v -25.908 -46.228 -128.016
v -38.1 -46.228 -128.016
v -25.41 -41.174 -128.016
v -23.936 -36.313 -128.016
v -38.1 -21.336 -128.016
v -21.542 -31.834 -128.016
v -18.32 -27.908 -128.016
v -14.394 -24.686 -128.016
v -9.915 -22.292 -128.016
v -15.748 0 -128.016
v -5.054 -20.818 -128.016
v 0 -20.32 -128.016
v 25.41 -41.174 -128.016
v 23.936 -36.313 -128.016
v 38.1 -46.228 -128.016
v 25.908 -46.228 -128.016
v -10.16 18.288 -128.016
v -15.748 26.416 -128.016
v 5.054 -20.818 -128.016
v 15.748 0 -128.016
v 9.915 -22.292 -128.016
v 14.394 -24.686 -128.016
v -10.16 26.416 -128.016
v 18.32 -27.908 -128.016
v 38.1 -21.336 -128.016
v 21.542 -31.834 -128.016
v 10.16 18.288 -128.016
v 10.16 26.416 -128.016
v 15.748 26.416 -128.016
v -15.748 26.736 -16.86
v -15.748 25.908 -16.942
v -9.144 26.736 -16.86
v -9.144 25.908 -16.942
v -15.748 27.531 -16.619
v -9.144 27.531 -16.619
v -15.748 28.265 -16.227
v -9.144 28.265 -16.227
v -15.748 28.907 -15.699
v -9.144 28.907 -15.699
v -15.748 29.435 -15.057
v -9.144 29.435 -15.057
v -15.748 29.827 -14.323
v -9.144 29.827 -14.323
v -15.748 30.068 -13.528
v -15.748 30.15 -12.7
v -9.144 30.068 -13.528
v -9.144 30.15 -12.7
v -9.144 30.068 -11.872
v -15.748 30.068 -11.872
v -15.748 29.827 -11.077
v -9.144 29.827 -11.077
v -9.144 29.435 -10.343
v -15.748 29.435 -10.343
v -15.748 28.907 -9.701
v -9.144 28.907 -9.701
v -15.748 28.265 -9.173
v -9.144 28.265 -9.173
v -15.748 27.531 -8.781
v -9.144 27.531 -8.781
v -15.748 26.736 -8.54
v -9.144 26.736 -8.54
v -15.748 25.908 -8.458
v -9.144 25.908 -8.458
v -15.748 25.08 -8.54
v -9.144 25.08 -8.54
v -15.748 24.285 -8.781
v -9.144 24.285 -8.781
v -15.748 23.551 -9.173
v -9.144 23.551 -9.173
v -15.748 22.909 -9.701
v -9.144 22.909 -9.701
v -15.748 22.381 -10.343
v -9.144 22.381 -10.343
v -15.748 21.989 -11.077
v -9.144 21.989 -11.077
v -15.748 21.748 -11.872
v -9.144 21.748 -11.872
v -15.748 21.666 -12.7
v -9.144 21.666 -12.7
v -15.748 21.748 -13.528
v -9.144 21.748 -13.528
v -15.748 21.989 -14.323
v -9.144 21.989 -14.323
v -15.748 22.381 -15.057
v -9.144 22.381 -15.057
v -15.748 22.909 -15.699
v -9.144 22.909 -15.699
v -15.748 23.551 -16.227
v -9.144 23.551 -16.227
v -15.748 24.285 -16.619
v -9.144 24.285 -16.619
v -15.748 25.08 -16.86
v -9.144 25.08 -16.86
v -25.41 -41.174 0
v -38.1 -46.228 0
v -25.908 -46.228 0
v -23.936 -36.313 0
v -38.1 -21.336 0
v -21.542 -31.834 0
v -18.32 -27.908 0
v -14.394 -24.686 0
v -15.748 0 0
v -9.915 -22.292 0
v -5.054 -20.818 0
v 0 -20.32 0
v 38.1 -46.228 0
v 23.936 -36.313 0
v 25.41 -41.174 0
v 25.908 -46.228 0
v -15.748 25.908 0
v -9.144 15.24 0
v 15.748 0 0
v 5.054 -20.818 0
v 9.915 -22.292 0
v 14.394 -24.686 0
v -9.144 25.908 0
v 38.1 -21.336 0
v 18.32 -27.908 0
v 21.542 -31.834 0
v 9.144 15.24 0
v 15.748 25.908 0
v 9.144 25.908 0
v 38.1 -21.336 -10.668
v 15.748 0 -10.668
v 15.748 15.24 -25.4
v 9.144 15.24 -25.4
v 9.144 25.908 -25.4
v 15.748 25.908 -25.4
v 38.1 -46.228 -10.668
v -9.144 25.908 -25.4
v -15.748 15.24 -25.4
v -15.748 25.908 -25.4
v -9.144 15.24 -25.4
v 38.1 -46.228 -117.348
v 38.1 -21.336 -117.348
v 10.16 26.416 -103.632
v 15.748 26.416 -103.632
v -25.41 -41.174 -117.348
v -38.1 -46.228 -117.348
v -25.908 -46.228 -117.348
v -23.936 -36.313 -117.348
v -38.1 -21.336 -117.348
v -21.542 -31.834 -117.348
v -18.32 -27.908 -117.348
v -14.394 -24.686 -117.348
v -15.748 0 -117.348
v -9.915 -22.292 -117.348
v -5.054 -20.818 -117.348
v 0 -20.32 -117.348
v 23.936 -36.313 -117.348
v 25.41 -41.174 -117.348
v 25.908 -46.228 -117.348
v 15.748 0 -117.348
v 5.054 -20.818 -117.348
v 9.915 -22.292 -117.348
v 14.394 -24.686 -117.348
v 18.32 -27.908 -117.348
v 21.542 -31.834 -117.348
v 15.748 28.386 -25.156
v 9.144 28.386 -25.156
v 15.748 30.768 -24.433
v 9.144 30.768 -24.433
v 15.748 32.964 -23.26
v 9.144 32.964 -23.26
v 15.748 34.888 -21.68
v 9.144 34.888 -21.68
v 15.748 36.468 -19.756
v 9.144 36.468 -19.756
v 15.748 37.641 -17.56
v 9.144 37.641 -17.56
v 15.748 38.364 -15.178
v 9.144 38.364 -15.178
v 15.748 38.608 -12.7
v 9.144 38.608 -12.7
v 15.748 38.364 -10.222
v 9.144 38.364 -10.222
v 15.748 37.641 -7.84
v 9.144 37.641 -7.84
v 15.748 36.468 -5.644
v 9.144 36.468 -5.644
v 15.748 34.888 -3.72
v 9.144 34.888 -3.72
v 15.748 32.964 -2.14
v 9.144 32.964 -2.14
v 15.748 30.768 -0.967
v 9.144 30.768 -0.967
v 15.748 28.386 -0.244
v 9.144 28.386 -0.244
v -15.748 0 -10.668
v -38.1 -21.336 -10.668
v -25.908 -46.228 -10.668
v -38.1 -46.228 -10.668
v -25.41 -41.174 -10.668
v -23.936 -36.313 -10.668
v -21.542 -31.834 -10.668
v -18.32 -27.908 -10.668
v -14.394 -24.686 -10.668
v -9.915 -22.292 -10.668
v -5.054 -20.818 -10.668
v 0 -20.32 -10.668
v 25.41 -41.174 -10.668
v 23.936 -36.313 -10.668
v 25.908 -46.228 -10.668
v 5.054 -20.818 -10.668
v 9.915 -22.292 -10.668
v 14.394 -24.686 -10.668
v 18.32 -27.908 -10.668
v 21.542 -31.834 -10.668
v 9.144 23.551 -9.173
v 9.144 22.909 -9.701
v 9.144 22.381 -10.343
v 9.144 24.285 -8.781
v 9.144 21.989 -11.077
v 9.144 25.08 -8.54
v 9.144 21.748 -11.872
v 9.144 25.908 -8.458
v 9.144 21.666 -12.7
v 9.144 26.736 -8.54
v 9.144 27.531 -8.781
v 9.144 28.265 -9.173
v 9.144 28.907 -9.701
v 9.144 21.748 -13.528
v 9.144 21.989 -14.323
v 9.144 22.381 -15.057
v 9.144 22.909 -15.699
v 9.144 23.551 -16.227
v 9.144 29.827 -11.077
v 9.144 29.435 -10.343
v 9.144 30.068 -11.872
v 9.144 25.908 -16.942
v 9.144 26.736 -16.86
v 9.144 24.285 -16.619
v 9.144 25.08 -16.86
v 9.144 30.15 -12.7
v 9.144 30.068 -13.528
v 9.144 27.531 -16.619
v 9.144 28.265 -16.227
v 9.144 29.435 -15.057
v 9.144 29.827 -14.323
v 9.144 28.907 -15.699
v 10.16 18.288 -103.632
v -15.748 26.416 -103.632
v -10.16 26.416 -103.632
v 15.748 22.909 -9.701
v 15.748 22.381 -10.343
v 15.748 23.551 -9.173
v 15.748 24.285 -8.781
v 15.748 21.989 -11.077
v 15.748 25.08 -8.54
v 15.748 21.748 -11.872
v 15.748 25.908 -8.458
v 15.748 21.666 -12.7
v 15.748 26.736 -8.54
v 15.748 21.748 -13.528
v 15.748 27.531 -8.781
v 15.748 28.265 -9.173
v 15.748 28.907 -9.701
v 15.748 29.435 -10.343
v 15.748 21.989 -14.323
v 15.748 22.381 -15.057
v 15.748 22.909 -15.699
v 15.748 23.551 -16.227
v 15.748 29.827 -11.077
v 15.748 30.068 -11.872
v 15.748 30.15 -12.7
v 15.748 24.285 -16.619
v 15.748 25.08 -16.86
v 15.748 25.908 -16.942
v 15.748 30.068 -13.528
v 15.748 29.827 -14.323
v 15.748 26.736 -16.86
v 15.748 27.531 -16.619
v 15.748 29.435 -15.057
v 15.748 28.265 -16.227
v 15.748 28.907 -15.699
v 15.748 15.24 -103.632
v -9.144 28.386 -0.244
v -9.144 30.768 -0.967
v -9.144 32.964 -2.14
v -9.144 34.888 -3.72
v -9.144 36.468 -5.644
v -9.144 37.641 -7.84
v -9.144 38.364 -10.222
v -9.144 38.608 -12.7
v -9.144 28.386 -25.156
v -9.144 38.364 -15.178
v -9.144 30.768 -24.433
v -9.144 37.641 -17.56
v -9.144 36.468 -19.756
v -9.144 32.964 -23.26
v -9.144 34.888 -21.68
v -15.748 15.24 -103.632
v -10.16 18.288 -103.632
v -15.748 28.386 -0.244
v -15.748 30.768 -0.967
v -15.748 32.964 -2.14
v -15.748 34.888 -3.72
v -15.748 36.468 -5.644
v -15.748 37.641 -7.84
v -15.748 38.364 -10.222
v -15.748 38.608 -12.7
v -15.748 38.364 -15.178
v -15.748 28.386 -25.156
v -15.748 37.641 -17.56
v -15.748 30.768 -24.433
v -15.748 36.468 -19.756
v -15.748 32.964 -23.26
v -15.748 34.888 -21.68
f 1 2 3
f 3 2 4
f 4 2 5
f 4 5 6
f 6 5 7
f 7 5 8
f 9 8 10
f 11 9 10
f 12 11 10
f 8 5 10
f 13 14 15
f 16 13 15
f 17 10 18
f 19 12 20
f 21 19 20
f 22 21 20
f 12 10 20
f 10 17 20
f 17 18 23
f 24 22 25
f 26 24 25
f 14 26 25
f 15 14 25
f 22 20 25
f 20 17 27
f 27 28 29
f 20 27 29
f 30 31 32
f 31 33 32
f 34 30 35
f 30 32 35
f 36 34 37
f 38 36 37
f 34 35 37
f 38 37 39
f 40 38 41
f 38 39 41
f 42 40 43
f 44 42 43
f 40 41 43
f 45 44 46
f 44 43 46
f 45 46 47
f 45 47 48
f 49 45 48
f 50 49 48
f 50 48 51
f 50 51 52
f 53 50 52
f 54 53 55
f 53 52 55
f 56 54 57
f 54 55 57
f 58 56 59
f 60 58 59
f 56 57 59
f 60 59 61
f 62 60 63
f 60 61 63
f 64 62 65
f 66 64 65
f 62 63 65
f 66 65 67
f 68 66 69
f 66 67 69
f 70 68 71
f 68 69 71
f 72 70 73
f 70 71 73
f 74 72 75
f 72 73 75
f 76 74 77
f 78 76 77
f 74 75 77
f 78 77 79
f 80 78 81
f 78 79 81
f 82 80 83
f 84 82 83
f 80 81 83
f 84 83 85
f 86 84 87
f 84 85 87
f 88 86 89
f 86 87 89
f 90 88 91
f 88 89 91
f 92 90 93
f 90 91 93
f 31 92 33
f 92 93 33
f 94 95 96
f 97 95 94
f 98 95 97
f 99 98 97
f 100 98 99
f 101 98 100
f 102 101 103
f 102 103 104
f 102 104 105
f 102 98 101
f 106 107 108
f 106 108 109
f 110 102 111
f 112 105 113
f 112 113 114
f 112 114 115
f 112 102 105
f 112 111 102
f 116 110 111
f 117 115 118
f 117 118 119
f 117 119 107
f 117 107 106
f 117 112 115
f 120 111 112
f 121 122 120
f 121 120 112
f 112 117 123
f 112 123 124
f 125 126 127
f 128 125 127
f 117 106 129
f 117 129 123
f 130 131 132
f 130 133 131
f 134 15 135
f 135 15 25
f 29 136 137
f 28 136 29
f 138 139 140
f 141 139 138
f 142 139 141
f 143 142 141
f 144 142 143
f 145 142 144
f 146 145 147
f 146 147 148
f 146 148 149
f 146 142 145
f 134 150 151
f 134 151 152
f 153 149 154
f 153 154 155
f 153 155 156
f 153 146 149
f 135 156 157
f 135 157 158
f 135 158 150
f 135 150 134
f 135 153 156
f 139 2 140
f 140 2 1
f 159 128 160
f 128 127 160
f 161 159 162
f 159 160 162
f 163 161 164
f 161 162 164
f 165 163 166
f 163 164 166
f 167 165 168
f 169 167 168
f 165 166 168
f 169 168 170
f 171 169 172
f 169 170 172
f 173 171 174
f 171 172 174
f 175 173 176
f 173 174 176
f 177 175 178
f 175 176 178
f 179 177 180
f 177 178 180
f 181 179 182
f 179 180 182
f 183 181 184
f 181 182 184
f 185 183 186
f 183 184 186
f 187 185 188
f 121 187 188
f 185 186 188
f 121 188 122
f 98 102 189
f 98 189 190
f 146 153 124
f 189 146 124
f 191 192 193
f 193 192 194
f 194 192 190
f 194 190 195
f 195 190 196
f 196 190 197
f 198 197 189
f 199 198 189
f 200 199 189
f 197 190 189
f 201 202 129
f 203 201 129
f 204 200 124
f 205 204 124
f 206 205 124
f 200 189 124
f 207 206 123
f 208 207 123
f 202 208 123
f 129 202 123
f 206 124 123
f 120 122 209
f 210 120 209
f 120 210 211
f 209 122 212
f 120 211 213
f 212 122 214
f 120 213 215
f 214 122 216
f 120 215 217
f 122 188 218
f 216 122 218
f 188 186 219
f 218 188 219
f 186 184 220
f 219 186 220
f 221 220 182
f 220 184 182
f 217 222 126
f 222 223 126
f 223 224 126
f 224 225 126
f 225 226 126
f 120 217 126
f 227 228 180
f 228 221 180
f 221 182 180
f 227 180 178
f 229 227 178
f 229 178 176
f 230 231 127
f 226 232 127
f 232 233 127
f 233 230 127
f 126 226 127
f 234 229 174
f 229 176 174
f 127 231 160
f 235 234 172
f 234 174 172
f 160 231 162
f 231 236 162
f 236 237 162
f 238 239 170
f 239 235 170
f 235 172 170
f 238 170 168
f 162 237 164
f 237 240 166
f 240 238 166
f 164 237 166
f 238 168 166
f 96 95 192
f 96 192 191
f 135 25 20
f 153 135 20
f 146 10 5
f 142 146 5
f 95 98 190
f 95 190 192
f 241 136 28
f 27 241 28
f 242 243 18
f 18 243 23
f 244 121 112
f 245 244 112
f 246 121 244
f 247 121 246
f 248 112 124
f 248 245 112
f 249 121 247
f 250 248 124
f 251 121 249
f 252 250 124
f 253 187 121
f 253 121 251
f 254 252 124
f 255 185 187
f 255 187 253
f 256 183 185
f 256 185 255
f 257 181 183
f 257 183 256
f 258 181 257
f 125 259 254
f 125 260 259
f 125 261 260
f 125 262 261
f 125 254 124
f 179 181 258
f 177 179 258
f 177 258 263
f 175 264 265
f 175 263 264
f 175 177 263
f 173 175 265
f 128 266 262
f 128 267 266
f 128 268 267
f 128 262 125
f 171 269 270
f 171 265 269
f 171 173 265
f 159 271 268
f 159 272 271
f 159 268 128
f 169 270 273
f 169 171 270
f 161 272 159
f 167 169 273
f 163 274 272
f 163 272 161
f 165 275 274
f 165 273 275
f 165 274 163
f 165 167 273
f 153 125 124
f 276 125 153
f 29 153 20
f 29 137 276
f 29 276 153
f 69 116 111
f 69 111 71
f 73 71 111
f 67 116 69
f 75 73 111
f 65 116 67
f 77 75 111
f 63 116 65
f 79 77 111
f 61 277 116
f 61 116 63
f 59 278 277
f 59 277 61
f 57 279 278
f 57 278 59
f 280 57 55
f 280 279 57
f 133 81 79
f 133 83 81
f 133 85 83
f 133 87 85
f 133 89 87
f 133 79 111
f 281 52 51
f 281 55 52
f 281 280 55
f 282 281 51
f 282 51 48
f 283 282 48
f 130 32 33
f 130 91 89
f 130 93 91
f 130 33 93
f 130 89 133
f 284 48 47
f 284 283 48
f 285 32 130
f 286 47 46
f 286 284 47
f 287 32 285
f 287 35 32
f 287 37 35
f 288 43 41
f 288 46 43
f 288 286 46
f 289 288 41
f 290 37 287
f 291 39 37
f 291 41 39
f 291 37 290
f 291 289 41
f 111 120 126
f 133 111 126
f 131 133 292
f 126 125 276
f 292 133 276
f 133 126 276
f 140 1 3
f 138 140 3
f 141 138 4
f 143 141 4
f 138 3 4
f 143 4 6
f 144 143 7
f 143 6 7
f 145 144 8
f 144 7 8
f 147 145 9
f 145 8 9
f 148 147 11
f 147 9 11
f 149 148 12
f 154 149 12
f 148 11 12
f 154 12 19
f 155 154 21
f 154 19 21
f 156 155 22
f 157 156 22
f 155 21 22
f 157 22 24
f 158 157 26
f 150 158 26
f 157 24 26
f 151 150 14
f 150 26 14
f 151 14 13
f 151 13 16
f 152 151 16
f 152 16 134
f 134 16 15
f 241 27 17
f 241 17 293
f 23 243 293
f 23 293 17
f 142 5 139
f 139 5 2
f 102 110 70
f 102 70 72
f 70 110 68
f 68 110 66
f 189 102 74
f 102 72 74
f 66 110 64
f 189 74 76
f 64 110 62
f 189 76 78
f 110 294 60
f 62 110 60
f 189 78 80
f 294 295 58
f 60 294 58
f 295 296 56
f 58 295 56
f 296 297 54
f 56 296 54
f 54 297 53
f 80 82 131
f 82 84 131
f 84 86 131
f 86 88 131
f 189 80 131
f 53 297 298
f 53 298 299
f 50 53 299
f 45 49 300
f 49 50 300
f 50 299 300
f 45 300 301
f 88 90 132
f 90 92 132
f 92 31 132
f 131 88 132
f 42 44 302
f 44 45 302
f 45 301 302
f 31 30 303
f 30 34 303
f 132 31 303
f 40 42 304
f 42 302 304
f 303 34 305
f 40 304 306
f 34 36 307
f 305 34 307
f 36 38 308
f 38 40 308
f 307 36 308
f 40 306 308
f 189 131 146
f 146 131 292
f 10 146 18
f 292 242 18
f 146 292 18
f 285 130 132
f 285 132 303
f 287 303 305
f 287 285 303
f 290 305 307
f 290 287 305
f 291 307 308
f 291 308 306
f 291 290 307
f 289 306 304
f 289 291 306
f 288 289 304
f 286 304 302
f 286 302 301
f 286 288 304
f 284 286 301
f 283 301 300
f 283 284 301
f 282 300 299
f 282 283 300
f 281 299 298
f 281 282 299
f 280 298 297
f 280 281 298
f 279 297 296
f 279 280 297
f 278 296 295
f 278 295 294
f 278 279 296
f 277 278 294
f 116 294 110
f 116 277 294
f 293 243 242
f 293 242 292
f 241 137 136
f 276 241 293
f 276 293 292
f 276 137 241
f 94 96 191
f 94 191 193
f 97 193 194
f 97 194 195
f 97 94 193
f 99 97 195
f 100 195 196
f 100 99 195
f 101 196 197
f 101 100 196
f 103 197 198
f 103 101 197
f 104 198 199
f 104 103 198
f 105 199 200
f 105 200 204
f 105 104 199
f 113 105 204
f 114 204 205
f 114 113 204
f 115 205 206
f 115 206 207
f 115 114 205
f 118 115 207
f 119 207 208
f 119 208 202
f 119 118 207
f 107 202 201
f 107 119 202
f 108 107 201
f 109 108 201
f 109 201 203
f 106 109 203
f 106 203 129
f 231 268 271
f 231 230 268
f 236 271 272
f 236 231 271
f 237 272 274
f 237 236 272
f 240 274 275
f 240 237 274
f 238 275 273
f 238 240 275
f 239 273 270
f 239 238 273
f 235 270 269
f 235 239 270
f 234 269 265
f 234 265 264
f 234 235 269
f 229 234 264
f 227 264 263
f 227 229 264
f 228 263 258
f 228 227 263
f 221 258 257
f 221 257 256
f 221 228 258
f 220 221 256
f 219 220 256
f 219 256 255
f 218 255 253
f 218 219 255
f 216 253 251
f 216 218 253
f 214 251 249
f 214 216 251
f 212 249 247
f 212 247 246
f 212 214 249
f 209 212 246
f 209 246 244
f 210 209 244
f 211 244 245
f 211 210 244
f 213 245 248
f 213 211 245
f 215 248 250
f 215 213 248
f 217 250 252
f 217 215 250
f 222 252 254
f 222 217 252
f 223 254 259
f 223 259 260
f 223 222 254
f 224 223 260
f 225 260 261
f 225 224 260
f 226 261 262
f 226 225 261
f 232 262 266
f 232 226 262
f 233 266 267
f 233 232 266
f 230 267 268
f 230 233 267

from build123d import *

# Parameters (mm, degrees)
BOSS_EXTRUDE1_DEPTH = 10.16
BOSS_EXTRUDE2_START = 9.144
SKETCH1_3_R         = 4.2418
BOSS_EXTRUDE2_DEPTH = 1.016
BOSS_EXTRUDE3_START = 10.16
SKETCH1_4_R         = 4.2418
SKETCH1_4_W         = 24.384
SKETCH1_4_H         = 8.128
SKETCH1_4_H_2       = 3.048
BOSS_EXTRUDE3_DEPTH = 5.588
BOSS_EXTRUDE4_DEPTH = 10.668
BOSS_EXTRUDE6_START = -128.016
BOSS_EXTRUDE6_DEPTH = 10.668


with BuildPart() as part:
    # Sketch1 → Boss-Extrude1 (new body)
    with BuildSketch(Plane(origin=(0, 0, 0), x_dir=(0, 0, -1), z_dir=(1, 0, 0))):
        Polygon((0, 15.24), (0, 0), (128.016, 0), (128.016, 18.288), (103.632, 18.288), (103.632, 15.24), align=None)
    boss_extrude1 = extrude(amount=BOSS_EXTRUDE1_DEPTH)

    # Sketch1<3> → Boss-Extrude2 (add)
    with BuildSketch(Plane(origin=(0, 0, 0), x_dir=(0, 0, -1), z_dir=(1, 0, 0)).offset(BOSS_EXTRUDE2_START)):
        with BuildLine():
            Line((0, 25.908), (0, 15.24))
            Line((0, 15.24), (25.4, 15.24))
            Line((25.4, 15.24), (25.4, 25.908))
            ThreePointArc((25.4, 25.908), (12.7, 38.608), (0, 25.908))
        make_face()
        with Locations((12.7, 25.908)):
            Circle(SKETCH1_3_R, mode=Mode.SUBTRACT)
    boss_extrude2 = extrude(amount=BOSS_EXTRUDE2_DEPTH)

    # Sketch1<4> → Boss-Extrude3 (add)
    with BuildSketch(Plane(origin=(0, 0, 0), x_dir=(0, 0, -1), z_dir=(1, 0, 0)).offset(BOSS_EXTRUDE3_START)):
        with BuildLine():
            Line((25.4, 15.24), (25.4, 25.908))
            ThreePointArc((25.4, 25.908), (12.7, 38.608), (0, 25.908))
            Line((0, 25.908), (0, 15.24))
            Line((0, 15.24), (25.4, 15.24))
        make_face()
        with Locations((12.7, 25.908)):
            Circle(SKETCH1_4_R, mode=Mode.SUBTRACT)
        Polygon((25.4, 15.24), (128.016, 15.24), (128.016, 0), (0, 0), (0, 15.24), align=None)
        with Locations((115.824, 22.352)):
            Rectangle(SKETCH1_4_W, SKETCH1_4_H)
        with Locations((115.824, 16.764)):
            Rectangle(SKETCH1_4_W, SKETCH1_4_H_2)
    boss_extrude3 = extrude(amount=BOSS_EXTRUDE3_DEPTH)

    # Mirror3: Boss-Extrude1, Boss-Extrude2, Boss-Extrude3 across plane
    add(boss_extrude1.mirror(Plane(origin=(0, 0, 0), x_dir=(0, 0, 1), z_dir=(1, 0, 0))))
    add(boss_extrude2.mirror(Plane(origin=(0, 0, 0), x_dir=(0, 0, 1), z_dir=(1, 0, 0))))
    add(boss_extrude3.mirror(Plane(origin=(0, 0, 0), x_dir=(0, 0, 1), z_dir=(1, 0, 0))))

    # Sketch2 → Boss-Extrude4 (add)
    with BuildSketch(Plane.XY):
        with BuildLine():
            Line((25.908, -46.228), (38.1, -46.228))
            Line((38.1, -46.228), (38.1, -21.336))
            Line((38.1, -21.336), (15.748, 0))
            Line((15.748, 0), (-15.748, 0))
            Line((-15.748, 0), (-38.1, -21.336))
            Line((-38.1, -21.336), (-38.1, -46.228))
            Line((-38.1, -46.228), (-25.908, -46.228))
            ThreePointArc((-25.908, -46.228), (0, -20.32), (25.908, -46.228))
        make_face()
    extrude(amount=-BOSS_EXTRUDE4_DEPTH)

    # Sketch2<2> → Boss-Extrude6 (add)
    with BuildSketch(Plane.XY.offset(BOSS_EXTRUDE6_START)):
        with BuildLine():
            ThreePointArc((-25.908, -46.228), (0, -20.32), (25.908, -46.228))
            Line((25.908, -46.228), (38.1, -46.228))
            Line((38.1, -46.228), (38.1, -21.336))
            Line((38.1, -21.336), (15.748, 0))
            Line((15.748, 0), (-15.748, 0))
            Line((-15.748, 0), (-38.1, -21.336))
            Line((-38.1, -21.336), (-38.1, -46.228))
            Line((-38.1, -46.228), (-25.908, -46.228))
        make_face()
    extrude(amount=BOSS_EXTRUDE6_DEPTH)


solid = part.part
